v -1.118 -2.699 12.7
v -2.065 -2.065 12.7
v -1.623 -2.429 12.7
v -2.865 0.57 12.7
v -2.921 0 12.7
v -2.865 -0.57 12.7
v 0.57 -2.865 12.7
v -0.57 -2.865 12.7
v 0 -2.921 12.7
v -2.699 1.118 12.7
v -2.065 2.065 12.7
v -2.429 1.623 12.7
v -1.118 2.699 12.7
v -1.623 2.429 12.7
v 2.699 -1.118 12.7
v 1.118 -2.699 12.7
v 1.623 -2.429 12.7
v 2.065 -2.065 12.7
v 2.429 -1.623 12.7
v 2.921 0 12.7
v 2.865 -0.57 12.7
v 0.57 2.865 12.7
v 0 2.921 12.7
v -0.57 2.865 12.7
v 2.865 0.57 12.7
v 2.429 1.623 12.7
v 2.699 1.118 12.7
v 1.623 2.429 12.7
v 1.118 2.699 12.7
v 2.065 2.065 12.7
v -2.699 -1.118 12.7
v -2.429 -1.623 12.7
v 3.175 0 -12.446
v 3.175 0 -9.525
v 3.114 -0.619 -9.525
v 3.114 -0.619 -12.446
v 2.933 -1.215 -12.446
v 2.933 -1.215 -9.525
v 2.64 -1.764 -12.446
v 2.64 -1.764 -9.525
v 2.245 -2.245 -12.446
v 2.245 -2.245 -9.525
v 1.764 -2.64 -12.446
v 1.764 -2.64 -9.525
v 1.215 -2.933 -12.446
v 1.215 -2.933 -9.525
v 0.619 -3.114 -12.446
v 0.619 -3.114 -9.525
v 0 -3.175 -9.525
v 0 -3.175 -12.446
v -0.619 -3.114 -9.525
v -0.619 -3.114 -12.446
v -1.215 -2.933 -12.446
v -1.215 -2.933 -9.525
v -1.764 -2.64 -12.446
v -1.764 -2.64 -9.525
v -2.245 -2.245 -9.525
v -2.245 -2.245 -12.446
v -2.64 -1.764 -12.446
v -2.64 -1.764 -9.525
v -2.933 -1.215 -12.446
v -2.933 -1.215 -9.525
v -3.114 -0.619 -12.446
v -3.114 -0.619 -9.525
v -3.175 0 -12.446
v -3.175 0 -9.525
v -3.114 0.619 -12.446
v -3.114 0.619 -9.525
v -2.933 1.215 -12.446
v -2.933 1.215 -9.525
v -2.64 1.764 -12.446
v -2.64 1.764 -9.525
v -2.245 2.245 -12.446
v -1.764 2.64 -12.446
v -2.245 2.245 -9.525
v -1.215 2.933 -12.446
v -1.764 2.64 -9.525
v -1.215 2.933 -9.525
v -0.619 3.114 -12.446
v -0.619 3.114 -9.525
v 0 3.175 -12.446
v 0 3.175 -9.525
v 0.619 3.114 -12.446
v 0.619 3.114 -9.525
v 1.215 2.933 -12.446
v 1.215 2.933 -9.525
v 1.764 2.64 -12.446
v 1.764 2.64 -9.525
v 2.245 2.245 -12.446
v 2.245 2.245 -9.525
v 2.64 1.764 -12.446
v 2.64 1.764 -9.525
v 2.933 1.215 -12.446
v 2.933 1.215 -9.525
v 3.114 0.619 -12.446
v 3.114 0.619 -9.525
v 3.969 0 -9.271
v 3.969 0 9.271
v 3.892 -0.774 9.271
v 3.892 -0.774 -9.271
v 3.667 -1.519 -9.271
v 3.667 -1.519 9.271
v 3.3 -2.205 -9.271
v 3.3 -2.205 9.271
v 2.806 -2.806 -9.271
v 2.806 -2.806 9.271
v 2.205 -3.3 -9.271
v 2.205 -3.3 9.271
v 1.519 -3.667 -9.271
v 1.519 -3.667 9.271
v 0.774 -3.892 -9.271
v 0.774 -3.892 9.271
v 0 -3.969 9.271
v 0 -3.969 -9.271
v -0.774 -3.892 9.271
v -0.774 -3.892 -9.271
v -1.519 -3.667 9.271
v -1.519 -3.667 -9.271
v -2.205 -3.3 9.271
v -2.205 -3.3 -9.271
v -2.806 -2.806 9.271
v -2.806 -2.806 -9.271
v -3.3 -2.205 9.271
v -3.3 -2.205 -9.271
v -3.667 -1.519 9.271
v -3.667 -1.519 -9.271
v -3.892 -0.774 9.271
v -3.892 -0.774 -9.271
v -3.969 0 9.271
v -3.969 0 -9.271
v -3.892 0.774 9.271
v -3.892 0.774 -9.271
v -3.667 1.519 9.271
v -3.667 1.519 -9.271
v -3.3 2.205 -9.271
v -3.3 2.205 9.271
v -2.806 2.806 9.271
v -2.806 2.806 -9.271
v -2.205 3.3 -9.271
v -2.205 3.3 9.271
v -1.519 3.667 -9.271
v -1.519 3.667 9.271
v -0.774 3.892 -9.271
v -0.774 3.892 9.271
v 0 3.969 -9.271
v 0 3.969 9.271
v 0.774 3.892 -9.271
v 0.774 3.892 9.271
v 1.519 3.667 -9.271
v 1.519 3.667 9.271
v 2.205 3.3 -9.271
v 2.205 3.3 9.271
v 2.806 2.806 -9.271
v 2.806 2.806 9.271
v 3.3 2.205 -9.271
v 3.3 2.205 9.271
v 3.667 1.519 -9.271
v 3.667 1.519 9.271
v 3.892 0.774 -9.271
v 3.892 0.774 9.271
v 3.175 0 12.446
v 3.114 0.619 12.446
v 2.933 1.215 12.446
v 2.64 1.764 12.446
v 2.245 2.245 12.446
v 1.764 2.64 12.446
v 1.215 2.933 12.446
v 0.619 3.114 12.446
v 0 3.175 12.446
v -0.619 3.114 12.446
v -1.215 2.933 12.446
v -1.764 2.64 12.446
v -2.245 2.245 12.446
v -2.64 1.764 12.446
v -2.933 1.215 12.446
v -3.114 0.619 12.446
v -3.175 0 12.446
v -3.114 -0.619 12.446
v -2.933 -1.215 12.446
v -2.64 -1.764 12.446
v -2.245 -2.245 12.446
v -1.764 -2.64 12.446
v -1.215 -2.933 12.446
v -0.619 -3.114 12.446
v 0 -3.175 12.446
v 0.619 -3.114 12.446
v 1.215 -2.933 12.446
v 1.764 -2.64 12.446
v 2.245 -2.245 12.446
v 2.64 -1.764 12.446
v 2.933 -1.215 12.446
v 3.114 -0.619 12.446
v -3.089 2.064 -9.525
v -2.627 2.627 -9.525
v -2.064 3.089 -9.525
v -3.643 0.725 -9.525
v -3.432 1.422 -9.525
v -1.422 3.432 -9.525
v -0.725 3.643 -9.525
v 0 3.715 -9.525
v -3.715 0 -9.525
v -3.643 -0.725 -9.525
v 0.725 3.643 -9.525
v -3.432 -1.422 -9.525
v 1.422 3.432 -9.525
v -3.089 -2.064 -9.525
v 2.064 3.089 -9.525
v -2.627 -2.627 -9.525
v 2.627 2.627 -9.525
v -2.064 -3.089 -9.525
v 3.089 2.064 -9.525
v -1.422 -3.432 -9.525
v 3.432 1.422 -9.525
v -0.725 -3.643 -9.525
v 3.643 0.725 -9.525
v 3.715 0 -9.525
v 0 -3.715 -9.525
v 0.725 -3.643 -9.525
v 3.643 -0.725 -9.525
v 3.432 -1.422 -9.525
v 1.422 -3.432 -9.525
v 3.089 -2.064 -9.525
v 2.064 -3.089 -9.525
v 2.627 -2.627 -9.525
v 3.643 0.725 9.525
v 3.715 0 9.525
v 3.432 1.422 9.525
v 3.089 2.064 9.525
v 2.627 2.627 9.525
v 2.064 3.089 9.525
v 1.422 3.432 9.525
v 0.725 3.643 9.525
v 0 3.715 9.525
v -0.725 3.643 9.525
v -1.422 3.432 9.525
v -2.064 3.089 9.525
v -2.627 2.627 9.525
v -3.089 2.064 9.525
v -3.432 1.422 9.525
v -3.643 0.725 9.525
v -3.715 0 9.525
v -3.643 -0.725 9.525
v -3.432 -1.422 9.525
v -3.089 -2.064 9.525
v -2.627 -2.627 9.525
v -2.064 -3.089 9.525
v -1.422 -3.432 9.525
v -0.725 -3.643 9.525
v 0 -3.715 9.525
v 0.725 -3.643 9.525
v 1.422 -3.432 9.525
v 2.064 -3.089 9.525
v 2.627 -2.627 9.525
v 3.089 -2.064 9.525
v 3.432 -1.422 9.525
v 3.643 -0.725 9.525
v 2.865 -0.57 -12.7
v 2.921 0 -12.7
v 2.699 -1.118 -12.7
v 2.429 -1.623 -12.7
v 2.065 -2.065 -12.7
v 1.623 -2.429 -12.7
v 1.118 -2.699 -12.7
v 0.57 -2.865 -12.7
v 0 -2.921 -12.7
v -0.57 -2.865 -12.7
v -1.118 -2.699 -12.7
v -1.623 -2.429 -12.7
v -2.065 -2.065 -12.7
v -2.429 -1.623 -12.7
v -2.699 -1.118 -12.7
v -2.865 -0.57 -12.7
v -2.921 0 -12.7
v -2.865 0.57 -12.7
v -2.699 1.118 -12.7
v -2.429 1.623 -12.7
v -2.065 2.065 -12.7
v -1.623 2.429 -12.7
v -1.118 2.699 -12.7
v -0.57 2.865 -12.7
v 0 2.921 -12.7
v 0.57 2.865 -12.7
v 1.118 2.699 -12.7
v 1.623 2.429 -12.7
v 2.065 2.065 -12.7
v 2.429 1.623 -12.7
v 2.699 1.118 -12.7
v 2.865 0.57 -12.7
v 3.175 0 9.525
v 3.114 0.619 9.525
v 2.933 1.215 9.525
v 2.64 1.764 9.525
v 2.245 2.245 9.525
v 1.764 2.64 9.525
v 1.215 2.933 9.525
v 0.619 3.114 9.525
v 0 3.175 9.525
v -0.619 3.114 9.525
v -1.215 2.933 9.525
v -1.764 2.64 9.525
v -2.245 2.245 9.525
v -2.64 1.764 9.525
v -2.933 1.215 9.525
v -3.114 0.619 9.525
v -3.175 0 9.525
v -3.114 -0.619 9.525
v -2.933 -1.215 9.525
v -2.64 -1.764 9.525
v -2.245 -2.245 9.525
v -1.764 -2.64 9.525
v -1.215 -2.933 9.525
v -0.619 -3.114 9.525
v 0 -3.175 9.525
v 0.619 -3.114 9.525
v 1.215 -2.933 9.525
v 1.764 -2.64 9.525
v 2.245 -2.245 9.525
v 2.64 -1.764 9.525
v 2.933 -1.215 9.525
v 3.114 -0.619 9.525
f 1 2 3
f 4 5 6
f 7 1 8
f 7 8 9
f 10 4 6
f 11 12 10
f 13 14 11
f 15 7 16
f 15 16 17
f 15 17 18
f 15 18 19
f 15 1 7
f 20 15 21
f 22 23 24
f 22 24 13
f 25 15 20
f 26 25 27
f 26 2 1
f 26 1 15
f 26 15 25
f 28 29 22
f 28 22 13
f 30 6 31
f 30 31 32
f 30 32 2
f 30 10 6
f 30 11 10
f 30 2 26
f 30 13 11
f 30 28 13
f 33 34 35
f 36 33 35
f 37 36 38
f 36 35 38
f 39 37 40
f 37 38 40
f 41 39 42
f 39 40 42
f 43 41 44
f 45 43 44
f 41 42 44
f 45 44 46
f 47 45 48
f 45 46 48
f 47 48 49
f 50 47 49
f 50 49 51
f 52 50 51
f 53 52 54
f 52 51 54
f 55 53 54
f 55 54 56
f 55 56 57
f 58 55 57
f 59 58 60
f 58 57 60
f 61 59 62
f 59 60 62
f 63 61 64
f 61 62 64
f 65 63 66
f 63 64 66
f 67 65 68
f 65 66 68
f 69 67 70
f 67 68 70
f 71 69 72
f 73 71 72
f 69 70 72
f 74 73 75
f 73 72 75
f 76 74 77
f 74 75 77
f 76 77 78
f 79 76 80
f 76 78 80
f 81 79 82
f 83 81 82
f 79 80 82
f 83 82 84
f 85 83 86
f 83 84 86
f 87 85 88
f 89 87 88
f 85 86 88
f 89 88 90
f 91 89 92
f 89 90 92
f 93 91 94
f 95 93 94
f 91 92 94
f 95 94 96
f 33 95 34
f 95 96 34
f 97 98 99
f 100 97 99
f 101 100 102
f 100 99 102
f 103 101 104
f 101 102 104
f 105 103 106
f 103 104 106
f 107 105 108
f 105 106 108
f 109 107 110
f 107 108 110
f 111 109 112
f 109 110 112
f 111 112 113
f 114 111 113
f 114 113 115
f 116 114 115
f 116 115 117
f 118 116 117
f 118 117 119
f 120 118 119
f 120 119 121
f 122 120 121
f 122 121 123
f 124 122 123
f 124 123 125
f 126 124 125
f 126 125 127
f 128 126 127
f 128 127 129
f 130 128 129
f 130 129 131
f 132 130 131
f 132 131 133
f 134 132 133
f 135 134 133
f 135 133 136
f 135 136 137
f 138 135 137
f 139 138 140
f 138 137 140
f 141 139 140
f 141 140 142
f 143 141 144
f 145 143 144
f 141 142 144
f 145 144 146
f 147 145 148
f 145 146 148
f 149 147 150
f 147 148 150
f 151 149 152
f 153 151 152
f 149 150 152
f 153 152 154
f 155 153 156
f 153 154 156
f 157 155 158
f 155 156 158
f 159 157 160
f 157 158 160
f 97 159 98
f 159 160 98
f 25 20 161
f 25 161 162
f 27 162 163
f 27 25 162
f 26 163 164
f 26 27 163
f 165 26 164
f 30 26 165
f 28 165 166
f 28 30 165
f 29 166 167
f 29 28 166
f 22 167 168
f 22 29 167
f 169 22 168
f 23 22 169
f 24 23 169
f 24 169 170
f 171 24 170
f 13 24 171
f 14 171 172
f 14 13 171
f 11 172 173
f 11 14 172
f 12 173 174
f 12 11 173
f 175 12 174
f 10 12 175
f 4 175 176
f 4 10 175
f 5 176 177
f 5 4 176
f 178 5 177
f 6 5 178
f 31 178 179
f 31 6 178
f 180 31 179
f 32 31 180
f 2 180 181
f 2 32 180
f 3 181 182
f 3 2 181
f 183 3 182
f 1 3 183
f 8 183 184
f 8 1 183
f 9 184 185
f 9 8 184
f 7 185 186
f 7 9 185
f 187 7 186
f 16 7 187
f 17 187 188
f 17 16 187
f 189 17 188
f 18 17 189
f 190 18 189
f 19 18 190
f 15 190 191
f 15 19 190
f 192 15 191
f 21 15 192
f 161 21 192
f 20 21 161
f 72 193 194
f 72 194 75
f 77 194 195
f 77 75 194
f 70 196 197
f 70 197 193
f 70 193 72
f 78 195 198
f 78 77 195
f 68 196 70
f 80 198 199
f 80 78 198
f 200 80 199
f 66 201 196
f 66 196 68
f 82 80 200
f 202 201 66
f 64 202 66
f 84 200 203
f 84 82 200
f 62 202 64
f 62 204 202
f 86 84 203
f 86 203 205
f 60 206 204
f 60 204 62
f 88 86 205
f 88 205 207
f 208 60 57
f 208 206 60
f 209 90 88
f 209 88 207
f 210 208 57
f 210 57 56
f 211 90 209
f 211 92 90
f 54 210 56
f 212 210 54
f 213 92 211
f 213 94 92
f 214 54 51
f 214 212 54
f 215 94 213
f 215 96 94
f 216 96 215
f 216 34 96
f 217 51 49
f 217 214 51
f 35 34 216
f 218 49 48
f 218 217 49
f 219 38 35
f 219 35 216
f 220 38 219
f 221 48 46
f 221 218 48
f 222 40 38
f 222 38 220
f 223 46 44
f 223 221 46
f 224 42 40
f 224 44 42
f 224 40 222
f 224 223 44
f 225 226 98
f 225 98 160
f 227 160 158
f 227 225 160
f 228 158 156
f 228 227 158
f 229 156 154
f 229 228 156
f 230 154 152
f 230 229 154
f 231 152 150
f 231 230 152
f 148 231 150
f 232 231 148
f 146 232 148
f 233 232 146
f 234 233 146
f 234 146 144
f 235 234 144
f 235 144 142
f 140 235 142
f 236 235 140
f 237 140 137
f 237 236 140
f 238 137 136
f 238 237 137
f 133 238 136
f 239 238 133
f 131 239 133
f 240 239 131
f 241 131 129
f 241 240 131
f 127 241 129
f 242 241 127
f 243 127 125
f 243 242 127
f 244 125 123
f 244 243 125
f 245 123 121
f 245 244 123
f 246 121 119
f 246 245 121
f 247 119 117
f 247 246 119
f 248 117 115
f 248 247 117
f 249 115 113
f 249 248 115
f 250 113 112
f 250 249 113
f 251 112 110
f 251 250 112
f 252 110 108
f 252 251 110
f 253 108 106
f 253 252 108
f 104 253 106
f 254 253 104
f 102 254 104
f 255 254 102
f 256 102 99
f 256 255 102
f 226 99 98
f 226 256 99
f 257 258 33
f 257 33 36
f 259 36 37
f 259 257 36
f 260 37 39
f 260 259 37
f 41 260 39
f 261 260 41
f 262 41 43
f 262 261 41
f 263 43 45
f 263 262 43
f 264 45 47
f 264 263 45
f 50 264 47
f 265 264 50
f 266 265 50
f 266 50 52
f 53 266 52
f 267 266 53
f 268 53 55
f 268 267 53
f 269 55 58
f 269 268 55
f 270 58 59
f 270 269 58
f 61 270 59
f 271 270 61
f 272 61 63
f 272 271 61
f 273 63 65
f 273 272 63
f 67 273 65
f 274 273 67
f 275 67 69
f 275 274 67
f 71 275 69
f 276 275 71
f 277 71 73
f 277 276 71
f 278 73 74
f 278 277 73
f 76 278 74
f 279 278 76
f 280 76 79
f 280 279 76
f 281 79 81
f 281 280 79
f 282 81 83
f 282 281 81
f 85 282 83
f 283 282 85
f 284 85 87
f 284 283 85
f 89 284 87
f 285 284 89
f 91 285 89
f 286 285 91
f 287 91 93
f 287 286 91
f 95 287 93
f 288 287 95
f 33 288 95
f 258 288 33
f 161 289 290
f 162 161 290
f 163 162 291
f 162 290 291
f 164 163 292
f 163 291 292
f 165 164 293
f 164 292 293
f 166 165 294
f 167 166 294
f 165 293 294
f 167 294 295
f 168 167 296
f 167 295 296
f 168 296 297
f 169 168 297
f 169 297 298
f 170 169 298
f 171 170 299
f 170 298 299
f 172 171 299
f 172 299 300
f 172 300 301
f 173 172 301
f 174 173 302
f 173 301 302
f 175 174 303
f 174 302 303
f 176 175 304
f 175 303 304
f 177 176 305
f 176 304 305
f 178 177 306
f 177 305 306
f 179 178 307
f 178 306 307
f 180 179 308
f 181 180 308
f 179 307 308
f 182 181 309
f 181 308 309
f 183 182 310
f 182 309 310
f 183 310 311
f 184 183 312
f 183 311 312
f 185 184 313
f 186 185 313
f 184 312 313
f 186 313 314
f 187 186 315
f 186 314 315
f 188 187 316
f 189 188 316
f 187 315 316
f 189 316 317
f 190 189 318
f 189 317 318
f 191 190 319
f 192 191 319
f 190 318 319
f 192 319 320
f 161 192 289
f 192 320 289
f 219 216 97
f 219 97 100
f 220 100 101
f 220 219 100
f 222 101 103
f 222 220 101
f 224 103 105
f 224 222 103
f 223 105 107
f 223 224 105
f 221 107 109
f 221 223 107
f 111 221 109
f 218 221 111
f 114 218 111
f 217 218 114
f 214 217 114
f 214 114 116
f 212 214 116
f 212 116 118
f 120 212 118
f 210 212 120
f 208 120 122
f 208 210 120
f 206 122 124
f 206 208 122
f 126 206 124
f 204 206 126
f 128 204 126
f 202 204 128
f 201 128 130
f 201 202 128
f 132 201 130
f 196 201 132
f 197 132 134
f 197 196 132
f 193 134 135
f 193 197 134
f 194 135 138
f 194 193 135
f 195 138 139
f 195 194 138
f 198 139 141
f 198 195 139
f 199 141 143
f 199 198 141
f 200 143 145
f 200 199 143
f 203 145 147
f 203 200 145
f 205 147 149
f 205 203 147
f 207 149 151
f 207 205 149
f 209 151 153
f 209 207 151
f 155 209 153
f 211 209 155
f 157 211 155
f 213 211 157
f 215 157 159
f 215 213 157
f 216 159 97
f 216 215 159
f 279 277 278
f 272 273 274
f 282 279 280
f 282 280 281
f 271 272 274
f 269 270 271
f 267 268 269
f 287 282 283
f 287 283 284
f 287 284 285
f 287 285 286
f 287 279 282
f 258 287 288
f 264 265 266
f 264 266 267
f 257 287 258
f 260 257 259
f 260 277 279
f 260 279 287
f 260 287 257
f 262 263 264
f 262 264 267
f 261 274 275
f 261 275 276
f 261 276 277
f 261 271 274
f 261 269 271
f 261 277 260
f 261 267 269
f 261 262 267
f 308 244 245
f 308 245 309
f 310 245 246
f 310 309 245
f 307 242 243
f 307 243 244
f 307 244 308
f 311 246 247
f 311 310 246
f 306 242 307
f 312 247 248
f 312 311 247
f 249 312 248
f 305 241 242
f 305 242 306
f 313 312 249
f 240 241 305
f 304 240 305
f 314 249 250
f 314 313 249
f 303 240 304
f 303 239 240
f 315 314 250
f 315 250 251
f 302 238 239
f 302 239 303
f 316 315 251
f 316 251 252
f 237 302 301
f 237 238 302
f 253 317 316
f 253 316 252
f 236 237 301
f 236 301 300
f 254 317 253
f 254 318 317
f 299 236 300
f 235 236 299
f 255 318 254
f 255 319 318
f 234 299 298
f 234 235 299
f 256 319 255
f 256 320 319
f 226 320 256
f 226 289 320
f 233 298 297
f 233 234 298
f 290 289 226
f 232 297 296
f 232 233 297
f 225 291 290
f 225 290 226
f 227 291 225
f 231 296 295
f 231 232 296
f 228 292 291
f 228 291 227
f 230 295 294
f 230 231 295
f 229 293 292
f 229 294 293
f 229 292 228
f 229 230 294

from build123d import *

# Parameters (mm, degrees)
F0_R     = 3.96875
F1_DEPTH = 9.525
F2_R     = 3.175
F3_DEPTH = 3.175
F4_R     = 3.96875
F5_DEPTH = 9.525
F6_R     = 3.175
F7_DEPTH = 3.175
F8_SIZE  = 0.254


with BuildPart() as f1:
    # F0 (on Top) → F1 (new body)
    with BuildSketch(Plane.XY):
        Circle(F0_R)
    extrude(amount=F1_DEPTH)



with BuildPart() as f3:
    # F2 (on face) → F3 (new body)
    with BuildSketch(Plane(origin=(0, 0, -9.525), x_dir=(1, 0, 0), z_dir=(0, 0, -1))):
        Circle(F2_R)
    extrude(amount=F3_DEPTH)


with BuildPart() as f1_1:
    add(f1.part)

    add(f3.part)  # F5 merges F3
    # F4 (on face) → F5 (join)
    with BuildSketch(Plane(origin=(0, 0, 0), x_dir=(1, 0, 0), z_dir=(0, 0, -1))):
        Circle(F4_R)
    extrude(amount=F5_DEPTH)

    # F6 (on face) → F7 (join)
    with BuildSketch(Plane.XY.offset(9.525)):
        Circle(F6_R)
    extrude(amount=F7_DEPTH)

    # F8
    f8_edges = [f1_1.edges().sort_by_distance(p)[0] for p in [
        (-3.175, 0, -12.7),
        (-3.96875, 0, 9.525),
        (-3.96875, 0, -9.525),
        (-3.175, 0, 12.7),
    ]]
    chamfer(f8_edges, length=F8_SIZE)


solid = f1_1.part
